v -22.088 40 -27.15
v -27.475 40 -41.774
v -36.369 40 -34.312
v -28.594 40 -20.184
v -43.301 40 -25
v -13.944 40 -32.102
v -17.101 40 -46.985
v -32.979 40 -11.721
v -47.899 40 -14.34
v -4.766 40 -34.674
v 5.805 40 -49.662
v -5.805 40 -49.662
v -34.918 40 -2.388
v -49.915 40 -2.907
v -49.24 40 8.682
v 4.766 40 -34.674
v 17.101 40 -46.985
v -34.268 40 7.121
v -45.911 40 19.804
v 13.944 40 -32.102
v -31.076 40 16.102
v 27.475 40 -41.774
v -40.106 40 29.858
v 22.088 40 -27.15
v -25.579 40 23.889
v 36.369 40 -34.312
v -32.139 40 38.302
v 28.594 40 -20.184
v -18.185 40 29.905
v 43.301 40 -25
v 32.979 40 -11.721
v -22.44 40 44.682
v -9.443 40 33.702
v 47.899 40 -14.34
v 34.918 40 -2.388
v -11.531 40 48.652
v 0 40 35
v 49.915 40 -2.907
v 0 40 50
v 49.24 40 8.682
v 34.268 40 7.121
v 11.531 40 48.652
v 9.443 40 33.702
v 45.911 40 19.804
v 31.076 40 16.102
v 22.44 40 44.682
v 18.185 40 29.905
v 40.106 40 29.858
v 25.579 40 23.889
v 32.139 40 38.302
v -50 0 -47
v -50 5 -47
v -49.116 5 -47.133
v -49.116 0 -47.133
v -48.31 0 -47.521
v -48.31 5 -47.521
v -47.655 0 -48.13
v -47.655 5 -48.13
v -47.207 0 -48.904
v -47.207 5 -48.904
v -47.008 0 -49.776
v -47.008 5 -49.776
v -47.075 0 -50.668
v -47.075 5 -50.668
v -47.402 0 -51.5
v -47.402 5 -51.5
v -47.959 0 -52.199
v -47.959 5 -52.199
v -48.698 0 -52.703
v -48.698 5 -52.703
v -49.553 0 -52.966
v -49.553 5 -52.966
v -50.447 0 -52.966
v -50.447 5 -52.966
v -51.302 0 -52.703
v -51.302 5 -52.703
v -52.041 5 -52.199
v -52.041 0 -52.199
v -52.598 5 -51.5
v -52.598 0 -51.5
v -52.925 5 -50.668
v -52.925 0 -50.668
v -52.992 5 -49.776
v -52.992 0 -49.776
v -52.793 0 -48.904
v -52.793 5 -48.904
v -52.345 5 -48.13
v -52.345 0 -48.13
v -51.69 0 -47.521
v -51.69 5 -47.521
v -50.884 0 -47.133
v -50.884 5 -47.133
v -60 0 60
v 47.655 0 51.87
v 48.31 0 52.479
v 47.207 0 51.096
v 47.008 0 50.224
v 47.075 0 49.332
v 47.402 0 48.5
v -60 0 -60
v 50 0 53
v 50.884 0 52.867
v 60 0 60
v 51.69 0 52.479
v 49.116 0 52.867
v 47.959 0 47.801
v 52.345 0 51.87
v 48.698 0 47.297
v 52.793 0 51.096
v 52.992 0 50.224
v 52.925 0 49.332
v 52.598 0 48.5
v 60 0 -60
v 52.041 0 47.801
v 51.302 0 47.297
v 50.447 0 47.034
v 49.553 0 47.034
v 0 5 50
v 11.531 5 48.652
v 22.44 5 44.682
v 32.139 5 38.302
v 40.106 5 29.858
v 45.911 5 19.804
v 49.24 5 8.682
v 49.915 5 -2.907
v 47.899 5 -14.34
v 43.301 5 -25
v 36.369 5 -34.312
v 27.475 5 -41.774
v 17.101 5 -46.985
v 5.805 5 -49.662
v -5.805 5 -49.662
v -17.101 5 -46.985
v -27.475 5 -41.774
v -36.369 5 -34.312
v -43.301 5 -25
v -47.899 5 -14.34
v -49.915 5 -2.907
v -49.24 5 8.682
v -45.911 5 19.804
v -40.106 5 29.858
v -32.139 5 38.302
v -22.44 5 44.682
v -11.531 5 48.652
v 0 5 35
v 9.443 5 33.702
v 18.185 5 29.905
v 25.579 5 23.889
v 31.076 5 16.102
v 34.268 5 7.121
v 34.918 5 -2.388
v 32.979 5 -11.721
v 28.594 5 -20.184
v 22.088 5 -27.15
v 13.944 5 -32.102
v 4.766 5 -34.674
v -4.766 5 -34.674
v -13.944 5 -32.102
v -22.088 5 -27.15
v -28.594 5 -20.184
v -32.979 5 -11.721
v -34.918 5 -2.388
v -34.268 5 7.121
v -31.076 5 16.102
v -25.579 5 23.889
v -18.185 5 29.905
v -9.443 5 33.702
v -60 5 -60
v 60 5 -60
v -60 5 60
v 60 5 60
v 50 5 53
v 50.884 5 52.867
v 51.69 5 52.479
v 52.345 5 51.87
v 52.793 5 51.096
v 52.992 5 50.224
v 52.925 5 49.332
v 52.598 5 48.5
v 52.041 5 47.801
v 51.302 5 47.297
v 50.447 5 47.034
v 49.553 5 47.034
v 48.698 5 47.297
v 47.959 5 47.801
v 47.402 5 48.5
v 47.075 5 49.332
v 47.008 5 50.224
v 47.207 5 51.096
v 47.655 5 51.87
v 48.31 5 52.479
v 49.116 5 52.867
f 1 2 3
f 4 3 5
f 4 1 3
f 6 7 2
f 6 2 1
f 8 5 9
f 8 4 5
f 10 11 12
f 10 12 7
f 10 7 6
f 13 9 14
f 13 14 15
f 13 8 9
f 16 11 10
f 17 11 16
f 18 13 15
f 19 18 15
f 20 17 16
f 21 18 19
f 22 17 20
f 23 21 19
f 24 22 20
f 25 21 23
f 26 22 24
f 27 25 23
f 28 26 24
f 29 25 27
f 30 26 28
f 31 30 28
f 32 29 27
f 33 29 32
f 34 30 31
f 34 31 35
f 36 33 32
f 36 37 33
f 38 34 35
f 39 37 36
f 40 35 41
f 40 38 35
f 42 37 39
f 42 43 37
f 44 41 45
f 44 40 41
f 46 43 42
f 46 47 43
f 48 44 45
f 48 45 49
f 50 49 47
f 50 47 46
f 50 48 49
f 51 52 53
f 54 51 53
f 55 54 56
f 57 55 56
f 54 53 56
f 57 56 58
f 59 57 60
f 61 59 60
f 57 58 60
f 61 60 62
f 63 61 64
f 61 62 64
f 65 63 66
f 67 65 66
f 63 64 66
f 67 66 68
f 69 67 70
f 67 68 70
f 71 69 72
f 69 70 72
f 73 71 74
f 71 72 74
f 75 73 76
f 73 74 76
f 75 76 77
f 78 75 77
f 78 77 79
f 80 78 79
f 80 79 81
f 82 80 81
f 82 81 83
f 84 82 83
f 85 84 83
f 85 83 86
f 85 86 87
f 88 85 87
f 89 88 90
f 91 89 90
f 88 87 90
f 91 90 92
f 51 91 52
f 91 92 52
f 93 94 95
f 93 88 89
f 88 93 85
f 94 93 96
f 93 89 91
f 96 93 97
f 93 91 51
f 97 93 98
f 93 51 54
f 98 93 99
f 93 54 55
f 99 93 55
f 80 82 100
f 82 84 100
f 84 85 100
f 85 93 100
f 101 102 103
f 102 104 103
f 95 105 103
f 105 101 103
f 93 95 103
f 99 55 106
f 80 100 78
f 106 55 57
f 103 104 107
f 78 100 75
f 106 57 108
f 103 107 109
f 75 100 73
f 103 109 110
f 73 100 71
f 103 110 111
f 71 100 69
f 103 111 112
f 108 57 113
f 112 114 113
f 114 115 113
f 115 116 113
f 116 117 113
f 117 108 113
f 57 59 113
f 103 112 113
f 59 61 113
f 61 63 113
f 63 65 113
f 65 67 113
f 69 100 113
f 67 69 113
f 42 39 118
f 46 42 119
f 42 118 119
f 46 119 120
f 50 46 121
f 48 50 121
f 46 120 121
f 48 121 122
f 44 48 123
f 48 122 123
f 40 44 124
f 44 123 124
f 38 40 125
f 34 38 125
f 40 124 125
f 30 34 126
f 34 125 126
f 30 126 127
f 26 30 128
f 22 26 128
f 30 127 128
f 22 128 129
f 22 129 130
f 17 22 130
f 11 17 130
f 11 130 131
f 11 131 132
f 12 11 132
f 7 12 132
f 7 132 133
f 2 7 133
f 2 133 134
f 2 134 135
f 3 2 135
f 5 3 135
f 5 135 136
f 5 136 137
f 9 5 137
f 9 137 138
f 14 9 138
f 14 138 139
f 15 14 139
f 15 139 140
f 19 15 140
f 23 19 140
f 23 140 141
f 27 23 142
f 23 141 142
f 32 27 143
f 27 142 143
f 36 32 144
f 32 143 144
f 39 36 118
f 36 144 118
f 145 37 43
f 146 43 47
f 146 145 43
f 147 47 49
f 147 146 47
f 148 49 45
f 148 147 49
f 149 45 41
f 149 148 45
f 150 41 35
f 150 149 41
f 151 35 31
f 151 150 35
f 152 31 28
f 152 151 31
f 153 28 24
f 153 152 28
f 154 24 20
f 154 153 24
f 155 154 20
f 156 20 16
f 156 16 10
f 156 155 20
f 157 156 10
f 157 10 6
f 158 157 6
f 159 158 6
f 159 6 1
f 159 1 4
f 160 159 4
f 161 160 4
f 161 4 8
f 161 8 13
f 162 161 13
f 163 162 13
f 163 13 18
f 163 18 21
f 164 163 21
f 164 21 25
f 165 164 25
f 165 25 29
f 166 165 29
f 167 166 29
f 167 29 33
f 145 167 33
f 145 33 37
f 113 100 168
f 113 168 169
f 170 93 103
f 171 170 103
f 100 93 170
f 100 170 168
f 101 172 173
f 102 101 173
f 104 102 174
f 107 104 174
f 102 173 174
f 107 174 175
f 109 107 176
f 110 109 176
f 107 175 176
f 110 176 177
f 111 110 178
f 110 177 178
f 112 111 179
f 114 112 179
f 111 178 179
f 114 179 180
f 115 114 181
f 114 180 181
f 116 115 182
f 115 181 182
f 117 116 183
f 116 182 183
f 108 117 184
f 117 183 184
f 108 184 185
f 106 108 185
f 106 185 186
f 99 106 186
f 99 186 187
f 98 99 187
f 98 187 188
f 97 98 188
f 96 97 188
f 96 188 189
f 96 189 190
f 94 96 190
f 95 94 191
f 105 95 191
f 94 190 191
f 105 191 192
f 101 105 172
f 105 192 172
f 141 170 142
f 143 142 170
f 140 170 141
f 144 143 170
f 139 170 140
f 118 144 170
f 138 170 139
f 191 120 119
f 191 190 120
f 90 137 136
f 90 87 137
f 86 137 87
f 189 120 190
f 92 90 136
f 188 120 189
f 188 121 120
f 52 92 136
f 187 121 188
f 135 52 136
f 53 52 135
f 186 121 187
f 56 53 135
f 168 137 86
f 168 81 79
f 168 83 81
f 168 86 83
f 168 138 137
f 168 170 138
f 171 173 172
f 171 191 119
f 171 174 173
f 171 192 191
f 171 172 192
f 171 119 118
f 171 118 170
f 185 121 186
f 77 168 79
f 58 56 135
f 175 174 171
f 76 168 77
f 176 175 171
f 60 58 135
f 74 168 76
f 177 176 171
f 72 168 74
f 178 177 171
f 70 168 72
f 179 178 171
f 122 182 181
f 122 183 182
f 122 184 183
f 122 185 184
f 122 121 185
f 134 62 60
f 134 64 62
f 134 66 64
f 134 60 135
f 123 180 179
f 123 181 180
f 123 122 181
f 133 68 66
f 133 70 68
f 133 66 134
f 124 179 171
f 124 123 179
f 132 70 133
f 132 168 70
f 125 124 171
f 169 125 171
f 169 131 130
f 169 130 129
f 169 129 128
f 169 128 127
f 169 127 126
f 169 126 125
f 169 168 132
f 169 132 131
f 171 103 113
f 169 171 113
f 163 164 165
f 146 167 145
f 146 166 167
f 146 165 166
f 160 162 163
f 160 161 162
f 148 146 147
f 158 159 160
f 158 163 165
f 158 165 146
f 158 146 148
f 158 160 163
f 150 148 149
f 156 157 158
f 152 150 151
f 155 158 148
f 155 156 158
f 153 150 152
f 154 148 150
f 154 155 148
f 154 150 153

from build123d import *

# Parameters (mm, degrees)
SKETCH1_R           = 50
SKETCH1_R_2         = 35
BOSS_EXTRUDE1_DEPTH = 40
SKETCH2_W           = 120
SKETCH2_H           = 120
BOSS_EXTRUDE2_DEPTH = 5
SKETCH3_R           = 3
CUT_EXTRUDE1_DEPTH  = 5


with BuildPart() as part:
    # Sketch1 → Boss-Extrude1 (new body)
    with BuildSketch(Plane(origin=(0, 0, 0), x_dir=(1, 0, 0), z_dir=(0, 1, 0))):
        with Locations(Location((0, 0, 0), (0, 0, 270))):
            Circle(SKETCH1_R)
        with Locations(Location((0, 0, 0), (0, 0, 270))):
            Circle(SKETCH1_R_2, mode=Mode.SUBTRACT)
    extrude(amount=BOSS_EXTRUDE1_DEPTH)

    # Sketch2 → Boss-Extrude2 (add)
    with BuildSketch(Plane(origin=(0, 0, 0), x_dir=(1, 0, 0), z_dir=(0, 1, 0))):
        Rectangle(SKETCH2_W, SKETCH2_H)
    extrude(amount=BOSS_EXTRUDE2_DEPTH)

    # Sketch3 → Cut-Extrude1 (cut)
    with BuildSketch(Plane(origin=(0, 5, 0), x_dir=(1, 0, 0), z_dir=(0, 1, 0))):
        with Locations(Location((-50, 50, 0), (0, 0, 270))):
            Circle(SKETCH3_R)
        with Locations(Location((50, -50, 0), (0, 0, 270))):
            Circle(SKETCH3_R)
    extrude(amount=-CUT_EXTRUDE1_DEPTH, mode=Mode.SUBTRACT)


solid = part.part
